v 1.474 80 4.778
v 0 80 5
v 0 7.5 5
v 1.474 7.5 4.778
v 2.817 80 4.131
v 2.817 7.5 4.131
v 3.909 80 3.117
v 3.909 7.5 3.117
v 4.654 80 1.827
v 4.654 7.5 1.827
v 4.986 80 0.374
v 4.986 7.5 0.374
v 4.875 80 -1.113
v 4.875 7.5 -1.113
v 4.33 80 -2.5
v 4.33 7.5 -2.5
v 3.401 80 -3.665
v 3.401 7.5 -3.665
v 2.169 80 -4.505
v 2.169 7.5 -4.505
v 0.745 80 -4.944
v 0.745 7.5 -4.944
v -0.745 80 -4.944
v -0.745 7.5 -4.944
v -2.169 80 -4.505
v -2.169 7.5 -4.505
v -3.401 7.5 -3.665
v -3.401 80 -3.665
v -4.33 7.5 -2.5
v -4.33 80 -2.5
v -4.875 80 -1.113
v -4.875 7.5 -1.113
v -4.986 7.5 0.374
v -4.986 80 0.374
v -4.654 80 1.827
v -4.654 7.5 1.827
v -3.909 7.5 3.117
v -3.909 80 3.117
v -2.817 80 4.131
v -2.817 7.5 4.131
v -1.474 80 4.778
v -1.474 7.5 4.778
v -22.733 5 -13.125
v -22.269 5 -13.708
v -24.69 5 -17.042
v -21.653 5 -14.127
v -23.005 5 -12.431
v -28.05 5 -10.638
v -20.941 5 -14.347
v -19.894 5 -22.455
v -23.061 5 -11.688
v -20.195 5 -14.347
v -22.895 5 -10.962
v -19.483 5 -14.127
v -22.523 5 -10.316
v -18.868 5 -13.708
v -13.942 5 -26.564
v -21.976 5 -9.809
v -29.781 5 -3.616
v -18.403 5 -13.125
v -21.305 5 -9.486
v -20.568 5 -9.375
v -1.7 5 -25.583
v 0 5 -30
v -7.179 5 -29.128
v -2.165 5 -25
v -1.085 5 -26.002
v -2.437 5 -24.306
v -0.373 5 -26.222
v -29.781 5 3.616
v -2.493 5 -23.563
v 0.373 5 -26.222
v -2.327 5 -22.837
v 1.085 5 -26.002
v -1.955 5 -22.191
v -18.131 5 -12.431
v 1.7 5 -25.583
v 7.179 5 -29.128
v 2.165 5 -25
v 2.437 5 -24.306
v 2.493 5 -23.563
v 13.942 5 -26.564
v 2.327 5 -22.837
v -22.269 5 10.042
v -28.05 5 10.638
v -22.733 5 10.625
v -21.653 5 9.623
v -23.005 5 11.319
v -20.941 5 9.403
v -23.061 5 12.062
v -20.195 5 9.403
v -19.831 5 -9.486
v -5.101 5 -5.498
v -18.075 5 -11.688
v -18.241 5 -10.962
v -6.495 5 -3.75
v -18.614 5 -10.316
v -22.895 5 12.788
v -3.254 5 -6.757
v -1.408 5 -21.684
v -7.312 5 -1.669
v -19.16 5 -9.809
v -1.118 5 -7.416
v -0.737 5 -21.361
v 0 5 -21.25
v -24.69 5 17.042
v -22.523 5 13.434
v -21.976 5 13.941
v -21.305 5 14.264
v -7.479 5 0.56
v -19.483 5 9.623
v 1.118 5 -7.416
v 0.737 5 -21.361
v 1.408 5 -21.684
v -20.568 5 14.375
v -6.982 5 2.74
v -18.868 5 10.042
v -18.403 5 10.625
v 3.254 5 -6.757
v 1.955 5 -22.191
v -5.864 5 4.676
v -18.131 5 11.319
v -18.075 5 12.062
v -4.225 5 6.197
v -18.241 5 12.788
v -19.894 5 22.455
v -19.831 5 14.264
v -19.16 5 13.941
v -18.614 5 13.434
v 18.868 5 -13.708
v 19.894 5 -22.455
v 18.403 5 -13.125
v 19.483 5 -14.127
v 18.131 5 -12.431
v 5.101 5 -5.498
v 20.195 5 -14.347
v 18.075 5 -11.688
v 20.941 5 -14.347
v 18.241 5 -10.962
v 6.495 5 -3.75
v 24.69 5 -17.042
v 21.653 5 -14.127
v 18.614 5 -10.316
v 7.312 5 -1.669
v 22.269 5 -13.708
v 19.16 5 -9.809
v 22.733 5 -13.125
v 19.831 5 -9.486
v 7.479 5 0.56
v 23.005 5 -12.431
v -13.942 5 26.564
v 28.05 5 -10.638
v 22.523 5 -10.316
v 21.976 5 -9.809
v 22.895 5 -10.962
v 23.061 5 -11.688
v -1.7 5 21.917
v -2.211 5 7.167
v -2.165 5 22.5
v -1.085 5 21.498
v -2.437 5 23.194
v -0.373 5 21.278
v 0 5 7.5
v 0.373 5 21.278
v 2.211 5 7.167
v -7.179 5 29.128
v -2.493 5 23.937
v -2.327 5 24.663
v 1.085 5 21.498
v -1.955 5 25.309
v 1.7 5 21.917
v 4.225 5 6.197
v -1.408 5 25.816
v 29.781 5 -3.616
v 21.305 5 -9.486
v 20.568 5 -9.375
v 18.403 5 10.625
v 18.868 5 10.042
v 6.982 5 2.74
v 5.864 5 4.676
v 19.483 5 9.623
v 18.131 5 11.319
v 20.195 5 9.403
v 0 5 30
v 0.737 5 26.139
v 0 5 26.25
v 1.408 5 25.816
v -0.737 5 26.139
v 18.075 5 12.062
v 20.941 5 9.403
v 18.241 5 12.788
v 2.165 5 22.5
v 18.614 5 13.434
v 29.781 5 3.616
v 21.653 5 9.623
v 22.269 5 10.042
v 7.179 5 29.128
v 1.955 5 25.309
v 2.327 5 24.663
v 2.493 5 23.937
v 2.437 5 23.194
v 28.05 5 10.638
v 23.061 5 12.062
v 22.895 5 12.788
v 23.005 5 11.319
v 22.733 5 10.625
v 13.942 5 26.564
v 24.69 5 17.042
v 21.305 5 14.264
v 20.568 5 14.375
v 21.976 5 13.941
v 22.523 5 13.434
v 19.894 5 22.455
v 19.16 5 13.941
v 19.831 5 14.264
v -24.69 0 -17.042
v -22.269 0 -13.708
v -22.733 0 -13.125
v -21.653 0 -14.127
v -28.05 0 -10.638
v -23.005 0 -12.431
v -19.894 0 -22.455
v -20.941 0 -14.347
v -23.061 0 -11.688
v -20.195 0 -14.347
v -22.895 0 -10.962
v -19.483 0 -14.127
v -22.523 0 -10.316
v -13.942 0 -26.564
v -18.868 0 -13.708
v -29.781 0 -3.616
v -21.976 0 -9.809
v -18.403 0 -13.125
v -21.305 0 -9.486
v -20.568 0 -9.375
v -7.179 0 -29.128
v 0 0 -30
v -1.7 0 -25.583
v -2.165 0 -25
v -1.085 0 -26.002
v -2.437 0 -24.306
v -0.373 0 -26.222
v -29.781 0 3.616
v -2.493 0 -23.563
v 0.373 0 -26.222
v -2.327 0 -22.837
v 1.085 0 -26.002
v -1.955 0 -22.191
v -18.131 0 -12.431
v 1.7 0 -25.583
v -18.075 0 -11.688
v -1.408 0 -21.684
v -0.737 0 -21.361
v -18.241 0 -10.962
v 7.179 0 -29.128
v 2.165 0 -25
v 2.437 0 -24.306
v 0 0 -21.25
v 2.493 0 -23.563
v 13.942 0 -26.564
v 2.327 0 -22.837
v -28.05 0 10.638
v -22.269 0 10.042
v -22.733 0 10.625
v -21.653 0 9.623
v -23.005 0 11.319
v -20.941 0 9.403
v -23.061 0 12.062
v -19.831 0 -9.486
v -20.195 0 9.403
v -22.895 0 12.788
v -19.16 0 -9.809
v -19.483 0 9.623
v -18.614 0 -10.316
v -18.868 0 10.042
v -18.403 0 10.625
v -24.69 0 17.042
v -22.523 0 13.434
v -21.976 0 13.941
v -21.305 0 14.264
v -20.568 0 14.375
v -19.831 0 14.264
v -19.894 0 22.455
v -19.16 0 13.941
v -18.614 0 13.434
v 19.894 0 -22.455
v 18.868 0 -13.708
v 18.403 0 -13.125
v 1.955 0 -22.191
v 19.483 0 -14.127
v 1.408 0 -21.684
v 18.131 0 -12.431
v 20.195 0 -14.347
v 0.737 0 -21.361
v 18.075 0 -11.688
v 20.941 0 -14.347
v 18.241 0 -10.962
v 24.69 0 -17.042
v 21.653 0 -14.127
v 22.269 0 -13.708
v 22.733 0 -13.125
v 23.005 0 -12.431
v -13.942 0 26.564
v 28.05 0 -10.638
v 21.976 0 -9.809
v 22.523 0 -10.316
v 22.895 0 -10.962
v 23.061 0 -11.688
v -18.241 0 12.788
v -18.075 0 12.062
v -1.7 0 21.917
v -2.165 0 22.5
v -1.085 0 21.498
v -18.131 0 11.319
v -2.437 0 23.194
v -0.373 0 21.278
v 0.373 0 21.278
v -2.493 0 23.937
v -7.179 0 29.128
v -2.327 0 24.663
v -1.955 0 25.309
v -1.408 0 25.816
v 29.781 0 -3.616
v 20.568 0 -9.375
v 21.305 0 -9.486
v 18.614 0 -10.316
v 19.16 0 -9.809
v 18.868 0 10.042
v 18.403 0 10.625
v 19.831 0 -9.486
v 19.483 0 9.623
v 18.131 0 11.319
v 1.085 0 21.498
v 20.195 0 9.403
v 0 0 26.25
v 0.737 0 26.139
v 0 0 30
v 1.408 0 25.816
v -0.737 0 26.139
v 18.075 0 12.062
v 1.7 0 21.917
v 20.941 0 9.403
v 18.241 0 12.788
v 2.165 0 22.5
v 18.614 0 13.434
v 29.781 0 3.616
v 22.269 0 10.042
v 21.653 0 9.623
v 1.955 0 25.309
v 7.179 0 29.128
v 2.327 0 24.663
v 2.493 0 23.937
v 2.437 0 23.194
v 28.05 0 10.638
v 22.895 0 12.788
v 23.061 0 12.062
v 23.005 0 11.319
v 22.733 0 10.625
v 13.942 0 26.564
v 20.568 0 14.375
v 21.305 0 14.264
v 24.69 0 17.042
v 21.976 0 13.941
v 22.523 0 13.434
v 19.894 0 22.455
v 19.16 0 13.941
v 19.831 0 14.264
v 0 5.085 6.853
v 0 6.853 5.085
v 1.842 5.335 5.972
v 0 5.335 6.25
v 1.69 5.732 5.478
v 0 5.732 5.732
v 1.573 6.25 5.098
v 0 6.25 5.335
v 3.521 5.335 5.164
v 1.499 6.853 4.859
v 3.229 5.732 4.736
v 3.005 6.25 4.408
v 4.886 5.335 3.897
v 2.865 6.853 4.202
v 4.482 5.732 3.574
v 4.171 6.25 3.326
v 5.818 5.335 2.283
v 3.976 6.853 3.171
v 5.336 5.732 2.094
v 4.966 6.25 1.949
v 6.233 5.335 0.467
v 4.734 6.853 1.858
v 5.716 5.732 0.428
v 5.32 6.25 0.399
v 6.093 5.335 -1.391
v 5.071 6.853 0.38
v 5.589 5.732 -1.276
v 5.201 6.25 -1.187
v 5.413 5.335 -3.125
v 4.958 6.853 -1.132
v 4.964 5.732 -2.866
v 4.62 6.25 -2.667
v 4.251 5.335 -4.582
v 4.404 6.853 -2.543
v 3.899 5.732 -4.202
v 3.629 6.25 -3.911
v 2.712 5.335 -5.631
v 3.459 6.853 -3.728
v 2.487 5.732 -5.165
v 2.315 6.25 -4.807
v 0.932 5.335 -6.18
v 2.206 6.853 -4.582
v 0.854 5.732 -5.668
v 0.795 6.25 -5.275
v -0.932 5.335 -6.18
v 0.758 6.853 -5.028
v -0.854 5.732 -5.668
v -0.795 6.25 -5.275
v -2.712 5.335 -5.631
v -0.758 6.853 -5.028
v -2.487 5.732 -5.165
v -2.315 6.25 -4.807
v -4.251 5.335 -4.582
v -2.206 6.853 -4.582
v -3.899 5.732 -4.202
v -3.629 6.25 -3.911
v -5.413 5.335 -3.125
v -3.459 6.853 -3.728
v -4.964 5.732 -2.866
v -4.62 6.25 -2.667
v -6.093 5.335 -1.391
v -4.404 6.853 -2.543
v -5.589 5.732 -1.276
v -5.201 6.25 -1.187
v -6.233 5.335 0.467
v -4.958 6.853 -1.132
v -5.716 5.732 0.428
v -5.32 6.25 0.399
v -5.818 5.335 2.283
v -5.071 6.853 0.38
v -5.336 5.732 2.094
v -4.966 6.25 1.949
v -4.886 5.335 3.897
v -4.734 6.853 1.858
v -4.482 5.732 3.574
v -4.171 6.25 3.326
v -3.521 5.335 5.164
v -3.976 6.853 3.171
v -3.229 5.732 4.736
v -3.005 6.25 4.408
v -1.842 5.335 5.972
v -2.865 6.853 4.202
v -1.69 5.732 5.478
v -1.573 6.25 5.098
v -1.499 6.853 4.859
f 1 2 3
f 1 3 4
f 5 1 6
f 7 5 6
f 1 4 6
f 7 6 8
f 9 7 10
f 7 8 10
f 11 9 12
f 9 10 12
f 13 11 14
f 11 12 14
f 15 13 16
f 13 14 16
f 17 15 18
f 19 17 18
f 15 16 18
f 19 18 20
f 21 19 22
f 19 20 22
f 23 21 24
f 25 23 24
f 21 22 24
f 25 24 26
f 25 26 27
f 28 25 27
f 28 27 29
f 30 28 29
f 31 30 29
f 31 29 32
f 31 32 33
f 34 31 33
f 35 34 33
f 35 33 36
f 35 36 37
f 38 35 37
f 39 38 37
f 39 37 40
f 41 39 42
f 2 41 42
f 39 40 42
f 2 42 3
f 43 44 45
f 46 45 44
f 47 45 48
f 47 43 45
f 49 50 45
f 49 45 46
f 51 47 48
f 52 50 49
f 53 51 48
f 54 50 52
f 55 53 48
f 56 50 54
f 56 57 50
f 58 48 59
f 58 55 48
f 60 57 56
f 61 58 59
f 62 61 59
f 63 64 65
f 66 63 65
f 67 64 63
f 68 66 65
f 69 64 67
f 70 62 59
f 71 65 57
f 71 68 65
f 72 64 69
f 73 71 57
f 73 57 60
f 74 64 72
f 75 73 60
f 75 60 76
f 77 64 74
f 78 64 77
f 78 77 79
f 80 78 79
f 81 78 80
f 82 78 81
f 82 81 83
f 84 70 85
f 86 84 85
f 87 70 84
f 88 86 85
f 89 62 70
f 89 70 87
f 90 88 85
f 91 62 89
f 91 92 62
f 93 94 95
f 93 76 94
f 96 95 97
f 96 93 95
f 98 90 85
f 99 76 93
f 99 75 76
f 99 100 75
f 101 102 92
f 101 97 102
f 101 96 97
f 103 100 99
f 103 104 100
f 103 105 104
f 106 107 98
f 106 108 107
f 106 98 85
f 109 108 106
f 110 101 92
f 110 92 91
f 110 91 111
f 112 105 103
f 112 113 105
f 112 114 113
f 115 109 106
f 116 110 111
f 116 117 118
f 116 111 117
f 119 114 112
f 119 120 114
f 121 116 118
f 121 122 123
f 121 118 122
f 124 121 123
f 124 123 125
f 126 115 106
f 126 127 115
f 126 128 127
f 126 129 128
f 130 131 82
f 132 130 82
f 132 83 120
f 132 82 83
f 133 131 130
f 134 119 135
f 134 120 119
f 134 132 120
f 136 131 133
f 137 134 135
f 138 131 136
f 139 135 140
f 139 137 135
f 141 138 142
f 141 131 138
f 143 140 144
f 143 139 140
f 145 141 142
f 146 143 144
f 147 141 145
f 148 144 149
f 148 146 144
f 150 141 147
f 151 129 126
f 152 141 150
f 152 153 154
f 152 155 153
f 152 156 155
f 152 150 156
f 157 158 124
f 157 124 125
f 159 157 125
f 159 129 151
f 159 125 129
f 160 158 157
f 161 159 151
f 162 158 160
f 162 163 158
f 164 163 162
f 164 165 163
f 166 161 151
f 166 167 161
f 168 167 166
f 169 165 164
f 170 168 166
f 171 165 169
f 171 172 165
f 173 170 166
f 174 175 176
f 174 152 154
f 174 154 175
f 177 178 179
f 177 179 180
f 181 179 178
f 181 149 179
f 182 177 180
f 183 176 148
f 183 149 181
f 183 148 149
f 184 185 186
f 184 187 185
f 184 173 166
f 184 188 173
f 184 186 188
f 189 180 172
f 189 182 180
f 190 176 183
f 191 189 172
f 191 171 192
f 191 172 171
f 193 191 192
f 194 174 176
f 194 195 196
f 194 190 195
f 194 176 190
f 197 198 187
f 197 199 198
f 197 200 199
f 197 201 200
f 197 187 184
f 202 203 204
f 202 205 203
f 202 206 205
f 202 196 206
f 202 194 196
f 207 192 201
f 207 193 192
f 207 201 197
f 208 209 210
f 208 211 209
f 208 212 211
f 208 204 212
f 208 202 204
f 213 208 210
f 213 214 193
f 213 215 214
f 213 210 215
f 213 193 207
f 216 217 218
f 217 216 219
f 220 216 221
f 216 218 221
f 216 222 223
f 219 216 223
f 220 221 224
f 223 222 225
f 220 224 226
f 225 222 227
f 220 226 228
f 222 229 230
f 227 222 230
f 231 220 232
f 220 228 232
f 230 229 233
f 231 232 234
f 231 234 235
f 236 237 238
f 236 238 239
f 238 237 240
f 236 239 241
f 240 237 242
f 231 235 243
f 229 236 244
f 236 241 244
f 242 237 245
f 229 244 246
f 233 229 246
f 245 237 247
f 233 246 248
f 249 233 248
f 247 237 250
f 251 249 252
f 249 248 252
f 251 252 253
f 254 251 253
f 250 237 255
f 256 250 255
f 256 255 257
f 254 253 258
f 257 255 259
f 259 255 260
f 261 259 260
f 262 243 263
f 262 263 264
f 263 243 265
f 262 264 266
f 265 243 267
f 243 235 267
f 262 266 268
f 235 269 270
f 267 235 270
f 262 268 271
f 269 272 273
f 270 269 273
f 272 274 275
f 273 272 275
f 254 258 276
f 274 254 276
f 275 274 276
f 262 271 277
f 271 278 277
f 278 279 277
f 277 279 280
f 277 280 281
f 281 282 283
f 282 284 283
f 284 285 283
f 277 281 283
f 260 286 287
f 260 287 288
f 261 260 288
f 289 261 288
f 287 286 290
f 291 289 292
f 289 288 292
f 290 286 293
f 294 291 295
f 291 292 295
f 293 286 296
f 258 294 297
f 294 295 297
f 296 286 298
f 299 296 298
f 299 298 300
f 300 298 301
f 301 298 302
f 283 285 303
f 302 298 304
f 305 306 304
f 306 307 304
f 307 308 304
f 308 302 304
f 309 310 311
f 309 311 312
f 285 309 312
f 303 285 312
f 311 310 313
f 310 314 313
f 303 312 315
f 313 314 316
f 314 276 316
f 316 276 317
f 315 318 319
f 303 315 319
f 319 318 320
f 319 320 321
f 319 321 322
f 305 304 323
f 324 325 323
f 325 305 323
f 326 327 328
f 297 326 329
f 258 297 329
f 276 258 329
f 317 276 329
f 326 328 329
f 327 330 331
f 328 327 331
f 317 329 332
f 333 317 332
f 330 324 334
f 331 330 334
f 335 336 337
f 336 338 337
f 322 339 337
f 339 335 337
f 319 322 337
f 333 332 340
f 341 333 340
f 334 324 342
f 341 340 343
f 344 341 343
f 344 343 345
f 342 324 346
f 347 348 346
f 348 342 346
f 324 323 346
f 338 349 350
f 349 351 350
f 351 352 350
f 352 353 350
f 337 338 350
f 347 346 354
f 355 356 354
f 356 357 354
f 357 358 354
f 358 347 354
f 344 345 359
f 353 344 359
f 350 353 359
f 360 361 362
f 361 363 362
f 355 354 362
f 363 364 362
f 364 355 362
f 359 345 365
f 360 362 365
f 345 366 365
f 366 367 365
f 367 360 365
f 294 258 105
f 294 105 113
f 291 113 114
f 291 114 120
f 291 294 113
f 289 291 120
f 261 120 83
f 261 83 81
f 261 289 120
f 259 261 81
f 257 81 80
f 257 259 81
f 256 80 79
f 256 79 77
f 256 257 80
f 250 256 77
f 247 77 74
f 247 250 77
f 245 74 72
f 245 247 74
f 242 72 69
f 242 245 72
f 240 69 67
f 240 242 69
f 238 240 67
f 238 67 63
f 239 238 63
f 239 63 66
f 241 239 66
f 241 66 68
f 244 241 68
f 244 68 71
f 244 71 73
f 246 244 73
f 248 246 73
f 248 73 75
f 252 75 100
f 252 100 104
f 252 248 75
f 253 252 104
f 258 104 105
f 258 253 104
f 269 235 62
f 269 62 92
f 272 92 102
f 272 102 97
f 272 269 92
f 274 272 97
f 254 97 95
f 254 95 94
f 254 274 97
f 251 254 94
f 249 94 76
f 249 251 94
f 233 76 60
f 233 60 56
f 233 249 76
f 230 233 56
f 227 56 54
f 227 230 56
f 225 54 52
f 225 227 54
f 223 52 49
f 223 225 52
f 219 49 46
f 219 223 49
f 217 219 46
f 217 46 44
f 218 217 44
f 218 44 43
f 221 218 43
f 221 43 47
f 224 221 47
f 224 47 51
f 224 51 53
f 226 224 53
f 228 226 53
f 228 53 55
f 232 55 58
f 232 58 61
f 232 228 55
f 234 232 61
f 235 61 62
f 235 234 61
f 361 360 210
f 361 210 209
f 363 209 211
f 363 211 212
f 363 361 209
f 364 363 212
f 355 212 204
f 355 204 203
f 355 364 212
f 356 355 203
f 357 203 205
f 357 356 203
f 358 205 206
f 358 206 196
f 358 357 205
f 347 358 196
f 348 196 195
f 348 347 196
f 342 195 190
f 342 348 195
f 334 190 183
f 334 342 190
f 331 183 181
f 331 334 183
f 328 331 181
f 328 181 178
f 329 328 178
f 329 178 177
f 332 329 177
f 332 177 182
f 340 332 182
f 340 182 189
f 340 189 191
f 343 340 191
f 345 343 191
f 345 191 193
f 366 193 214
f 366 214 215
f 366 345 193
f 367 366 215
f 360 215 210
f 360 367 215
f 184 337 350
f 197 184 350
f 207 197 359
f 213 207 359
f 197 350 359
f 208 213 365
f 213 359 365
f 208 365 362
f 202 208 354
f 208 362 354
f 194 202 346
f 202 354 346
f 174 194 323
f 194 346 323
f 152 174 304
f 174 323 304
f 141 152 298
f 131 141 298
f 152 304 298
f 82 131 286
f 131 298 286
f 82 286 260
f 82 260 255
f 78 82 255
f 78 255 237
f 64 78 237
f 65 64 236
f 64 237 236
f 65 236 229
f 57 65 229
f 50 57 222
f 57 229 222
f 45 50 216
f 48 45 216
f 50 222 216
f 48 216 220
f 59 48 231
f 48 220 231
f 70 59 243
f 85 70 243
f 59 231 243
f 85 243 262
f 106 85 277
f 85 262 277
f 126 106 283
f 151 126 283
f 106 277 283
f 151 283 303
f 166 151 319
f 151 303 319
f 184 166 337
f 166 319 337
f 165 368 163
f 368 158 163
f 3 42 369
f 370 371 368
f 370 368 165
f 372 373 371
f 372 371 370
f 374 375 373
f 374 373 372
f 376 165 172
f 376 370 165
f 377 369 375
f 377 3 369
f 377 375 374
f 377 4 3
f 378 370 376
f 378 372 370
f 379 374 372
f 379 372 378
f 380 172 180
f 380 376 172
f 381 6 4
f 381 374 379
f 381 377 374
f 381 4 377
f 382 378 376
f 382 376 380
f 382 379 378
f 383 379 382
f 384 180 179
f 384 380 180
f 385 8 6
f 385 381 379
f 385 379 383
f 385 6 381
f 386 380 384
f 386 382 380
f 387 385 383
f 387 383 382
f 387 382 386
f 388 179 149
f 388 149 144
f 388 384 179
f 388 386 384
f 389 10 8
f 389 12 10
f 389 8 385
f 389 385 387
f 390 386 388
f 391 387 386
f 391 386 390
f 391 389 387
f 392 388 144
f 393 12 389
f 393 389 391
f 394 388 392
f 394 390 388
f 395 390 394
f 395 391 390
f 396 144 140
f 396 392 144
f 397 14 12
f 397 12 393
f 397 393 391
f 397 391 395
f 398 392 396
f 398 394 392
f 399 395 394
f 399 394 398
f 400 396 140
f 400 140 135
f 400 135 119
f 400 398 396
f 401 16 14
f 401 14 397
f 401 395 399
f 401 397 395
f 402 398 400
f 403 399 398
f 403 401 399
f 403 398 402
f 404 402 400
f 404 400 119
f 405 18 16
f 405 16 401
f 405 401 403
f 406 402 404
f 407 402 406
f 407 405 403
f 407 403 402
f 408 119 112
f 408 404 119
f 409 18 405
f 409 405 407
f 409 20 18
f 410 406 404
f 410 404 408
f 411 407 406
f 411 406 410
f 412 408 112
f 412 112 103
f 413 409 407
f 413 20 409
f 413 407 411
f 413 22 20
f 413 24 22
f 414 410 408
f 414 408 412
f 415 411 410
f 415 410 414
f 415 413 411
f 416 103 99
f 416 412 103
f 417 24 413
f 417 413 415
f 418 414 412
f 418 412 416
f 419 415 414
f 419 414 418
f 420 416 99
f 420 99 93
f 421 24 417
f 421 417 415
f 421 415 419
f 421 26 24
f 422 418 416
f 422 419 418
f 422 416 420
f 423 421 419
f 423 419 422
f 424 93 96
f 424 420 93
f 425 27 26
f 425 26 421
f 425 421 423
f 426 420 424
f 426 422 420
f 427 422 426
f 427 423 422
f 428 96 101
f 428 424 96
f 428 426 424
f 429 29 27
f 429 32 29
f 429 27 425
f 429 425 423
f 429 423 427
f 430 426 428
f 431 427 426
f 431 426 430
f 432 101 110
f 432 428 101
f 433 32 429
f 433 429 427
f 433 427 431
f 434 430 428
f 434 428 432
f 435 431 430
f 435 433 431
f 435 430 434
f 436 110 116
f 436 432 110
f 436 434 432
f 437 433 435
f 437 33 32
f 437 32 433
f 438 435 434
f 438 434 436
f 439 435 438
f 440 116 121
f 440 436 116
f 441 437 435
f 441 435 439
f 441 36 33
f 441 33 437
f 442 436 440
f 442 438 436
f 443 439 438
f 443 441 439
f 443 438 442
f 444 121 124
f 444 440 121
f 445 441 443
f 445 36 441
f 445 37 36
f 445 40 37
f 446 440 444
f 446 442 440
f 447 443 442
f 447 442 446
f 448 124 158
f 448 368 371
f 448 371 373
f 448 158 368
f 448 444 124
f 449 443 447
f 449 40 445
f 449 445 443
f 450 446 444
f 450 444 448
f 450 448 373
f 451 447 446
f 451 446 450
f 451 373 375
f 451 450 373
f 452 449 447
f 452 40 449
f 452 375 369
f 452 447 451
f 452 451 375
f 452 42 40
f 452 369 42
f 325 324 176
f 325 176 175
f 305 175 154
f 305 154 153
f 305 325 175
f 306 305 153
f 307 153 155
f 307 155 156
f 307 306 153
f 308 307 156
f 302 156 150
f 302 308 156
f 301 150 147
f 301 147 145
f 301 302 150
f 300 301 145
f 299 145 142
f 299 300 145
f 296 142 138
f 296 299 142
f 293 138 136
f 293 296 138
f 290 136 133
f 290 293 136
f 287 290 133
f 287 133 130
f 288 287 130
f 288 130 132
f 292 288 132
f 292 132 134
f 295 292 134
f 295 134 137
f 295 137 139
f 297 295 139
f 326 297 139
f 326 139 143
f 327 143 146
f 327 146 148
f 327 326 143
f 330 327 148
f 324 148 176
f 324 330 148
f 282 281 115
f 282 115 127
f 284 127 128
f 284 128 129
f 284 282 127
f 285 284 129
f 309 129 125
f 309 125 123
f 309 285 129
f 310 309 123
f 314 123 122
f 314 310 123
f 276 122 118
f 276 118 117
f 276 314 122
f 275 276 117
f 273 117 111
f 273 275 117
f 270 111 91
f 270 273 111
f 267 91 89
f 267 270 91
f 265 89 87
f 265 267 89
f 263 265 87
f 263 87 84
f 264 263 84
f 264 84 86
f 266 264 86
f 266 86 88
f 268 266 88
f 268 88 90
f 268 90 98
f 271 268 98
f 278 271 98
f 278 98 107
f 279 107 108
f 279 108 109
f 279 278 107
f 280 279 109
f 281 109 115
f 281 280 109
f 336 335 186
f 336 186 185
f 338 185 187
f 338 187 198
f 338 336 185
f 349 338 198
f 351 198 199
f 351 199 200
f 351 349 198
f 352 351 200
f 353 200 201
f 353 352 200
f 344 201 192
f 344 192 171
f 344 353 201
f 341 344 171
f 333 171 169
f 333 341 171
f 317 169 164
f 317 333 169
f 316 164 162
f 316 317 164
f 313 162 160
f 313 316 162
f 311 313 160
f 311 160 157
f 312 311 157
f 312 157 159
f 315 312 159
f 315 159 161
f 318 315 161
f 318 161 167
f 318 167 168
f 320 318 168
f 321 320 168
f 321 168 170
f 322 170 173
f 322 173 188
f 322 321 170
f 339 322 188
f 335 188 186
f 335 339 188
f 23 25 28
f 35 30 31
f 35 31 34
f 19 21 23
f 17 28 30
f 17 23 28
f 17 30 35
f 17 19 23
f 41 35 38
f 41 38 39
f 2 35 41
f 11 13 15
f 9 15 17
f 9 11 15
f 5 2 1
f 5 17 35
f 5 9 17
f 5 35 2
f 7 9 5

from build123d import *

# Parameters (mm, degrees)
SKETCH1_R           = 30
SKETCH1_R_2         = 2.5
BOSS_EXTRUDE1_DEPTH = 5
SKETCH2_R           = 5
BOSS_EXTRUDE2_DEPTH = 75
FILLET1_R           = 2.5


with BuildPart() as part:
    # Sketch1 → Boss-Extrude1 (new body)
    with BuildSketch(Plane(origin=(0, 0, 0), x_dir=(1, 0, 0), z_dir=(0, 1, 0))):
        with Locations(Location((0, 0, 0), (0, 0, 270))):
            Circle(SKETCH1_R)
        with Locations(Location((-20.56810334, 11.875, 0), (0, 0, 270))):
            Circle(SKETCH1_R_2, mode=Mode.SUBTRACT)
        with Locations(Location((0, 23.75, 0), (0, 0, 270))):
            Circle(SKETCH1_R_2, mode=Mode.SUBTRACT)
        with Locations(Location((20.56810334, 11.875, 0), (0, 0, 270))):
            Circle(SKETCH1_R_2, mode=Mode.SUBTRACT)
        with Locations(Location((20.56810334, -11.875, 0), (0, 0, 270))):
            Circle(SKETCH1_R_2, mode=Mode.SUBTRACT)
        with Locations(Location((0, -23.75, 0), (0, 0, 270))):
            Circle(SKETCH1_R_2, mode=Mode.SUBTRACT)
        with Locations(Location((-20.56810334, -11.875, 0), (0, 0, 270))):
            Circle(SKETCH1_R_2, mode=Mode.SUBTRACT)
    extrude(amount=BOSS_EXTRUDE1_DEPTH)

    # Sketch2 → Boss-Extrude2 (add)
    with BuildSketch(Plane(origin=(0, 5, 0), x_dir=(1, 0, 0), z_dir=(0, 1, 0))):
        with Locations(Location((0, 0, 0), (0, 0, 270))):
            Circle(SKETCH2_R)
    extrude(amount=BOSS_EXTRUDE2_DEPTH)

    # Fillet1
    fillet1_edges = [part.edges().sort_by_distance(p)[0] for p in [
        (0, 5, -5),
    ]]
    fillet(fillet1_edges, radius=FILLET1_R)


solid = part.part
